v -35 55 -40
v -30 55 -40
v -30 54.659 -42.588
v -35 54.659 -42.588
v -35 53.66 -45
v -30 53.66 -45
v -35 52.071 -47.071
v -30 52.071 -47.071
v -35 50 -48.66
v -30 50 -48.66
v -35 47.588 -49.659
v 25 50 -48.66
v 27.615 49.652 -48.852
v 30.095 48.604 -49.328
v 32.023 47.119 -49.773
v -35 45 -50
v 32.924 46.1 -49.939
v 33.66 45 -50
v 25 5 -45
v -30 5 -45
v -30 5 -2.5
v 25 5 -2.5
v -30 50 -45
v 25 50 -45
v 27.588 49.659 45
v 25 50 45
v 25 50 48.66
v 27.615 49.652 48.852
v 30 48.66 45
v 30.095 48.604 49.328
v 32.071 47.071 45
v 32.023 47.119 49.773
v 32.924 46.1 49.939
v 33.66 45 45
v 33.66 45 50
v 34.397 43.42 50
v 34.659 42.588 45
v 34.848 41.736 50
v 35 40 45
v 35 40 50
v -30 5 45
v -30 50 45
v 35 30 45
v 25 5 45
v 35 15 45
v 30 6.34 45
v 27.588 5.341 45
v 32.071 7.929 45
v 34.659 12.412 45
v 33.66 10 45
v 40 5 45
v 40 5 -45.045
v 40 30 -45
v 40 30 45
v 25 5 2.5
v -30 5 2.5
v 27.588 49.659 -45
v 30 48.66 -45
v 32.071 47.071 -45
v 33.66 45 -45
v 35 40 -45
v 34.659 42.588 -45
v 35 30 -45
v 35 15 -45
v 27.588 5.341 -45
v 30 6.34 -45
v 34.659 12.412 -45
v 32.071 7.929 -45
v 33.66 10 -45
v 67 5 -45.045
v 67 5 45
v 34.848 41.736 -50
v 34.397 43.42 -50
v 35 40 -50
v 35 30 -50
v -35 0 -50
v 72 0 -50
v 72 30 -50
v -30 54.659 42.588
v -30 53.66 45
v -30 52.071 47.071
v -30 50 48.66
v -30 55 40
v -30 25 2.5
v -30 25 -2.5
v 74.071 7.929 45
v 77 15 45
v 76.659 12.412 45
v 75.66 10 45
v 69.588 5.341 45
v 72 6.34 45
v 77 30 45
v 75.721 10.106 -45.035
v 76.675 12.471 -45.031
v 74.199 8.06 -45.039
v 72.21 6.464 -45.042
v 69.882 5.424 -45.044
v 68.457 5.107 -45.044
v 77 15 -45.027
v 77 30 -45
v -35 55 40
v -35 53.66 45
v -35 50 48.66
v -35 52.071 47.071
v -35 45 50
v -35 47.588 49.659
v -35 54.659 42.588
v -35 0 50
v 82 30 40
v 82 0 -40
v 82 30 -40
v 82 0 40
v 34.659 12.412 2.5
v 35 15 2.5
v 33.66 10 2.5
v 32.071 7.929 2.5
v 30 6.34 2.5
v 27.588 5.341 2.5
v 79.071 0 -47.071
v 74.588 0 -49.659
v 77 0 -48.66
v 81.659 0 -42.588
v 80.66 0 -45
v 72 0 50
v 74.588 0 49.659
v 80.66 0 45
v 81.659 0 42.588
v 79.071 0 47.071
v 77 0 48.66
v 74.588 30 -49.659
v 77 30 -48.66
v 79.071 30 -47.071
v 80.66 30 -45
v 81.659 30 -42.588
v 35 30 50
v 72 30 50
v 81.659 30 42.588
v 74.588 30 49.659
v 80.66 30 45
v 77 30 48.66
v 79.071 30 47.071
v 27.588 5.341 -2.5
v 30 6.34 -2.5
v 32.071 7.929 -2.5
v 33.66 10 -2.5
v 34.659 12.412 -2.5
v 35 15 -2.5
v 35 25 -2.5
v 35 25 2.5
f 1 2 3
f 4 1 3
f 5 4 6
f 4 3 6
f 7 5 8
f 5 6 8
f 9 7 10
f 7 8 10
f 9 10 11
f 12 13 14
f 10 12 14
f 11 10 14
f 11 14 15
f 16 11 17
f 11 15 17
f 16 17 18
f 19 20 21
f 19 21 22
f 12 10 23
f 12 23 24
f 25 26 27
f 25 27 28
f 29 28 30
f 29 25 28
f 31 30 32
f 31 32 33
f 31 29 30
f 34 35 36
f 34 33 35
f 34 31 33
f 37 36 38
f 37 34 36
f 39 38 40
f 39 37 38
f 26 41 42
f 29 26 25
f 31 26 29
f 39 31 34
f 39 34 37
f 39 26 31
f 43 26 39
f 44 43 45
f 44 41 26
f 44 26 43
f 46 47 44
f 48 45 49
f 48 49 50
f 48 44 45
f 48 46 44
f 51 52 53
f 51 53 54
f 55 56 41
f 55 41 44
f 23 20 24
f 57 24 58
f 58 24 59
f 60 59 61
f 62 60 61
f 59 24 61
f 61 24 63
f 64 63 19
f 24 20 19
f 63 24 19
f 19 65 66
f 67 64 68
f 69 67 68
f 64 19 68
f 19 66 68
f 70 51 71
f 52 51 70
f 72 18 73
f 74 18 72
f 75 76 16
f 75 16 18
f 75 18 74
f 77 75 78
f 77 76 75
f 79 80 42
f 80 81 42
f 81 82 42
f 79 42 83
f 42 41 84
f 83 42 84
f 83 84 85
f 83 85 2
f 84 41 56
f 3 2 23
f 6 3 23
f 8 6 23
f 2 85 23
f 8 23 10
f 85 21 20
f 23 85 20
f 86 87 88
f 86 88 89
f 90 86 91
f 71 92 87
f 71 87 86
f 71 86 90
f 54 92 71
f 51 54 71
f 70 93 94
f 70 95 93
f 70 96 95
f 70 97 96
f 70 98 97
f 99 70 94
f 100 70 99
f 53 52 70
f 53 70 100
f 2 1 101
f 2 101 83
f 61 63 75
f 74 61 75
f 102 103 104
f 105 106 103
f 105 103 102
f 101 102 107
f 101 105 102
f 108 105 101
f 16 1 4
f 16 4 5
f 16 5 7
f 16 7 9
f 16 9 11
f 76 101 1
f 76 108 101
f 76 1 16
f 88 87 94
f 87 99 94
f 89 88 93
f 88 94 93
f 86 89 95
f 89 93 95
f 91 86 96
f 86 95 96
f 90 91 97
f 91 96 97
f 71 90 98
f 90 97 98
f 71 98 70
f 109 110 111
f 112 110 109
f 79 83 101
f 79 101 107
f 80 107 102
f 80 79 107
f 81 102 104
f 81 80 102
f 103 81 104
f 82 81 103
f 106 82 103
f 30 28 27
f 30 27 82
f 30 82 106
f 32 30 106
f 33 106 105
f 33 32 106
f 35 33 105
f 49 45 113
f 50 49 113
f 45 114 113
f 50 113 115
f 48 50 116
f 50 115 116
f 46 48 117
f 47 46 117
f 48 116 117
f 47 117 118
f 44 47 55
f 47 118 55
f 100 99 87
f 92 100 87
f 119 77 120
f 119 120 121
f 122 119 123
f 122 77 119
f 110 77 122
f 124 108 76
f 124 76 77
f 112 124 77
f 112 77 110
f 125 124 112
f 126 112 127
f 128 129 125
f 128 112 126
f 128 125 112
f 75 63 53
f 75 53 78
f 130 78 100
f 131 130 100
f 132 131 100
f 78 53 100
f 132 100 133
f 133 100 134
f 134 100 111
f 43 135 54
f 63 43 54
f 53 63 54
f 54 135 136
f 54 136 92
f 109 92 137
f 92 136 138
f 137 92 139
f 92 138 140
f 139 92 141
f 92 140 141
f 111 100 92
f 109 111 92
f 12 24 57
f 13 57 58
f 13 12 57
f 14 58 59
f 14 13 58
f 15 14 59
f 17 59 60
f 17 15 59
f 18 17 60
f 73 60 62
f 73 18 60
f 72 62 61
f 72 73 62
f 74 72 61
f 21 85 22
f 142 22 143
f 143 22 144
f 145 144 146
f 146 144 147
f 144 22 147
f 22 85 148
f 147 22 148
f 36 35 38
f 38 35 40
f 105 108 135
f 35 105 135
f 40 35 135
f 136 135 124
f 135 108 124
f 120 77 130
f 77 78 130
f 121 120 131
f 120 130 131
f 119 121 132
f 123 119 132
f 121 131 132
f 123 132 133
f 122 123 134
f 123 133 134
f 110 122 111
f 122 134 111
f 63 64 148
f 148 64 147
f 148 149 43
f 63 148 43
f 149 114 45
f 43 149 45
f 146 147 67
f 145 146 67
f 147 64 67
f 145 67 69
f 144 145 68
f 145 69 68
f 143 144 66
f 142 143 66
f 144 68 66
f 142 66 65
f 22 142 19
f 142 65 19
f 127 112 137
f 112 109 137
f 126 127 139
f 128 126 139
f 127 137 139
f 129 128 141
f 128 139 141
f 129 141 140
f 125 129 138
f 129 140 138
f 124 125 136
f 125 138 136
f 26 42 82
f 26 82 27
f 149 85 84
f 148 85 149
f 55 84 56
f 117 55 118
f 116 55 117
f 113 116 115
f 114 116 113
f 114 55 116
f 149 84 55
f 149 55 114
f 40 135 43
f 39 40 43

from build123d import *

# Parameters (mm, degrees)
CROQUIS1_W                   = 70
CROQUIS1_H                   = 100
SALIENTE_EXTRUIR2_DEPTH      = 5
CROQUIS2_W                   = 5
CROQUIS2_H                   = 100
SALIENTE_EXTRUIR3_DEPTH      = 50
CROQUIS3_W                   = 65
CROQUIS3_H                   = 5
SALIENTE_EXTRUIR4_DEPTH      = 45
CROQUIS4_W                   = 65
CROQUIS4_H                   = 5
SALIENTE_EXTRUIR5_DEPTH      = 45
CROQUIS5_W                   = 5
CROQUIS5_H                   = 100
SALIENTE_EXTRUIR6_DEPTH      = 30
REDONDEO2_R                  = 10
REDONDEO3_R                  = 10
REDONDEO4_R                  = 10
REDONDEO5_R                  = 10
SALIENTE_EXTRUIR8_DEPTH      = 2.5
SALIENTE_EXTRUIR8_DEPTH_BACK = 2.5
CROQUIS10_W                  = 65
CROQUIS10_H                  = 20
SALIENTE_EXTRUIR9_DEPTH      = 37
CROQUIS12_W                  = 5
CROQUIS12_H                  = 100
SALIENTE_EXTRUIR10_DEPTH     = 30
REDONDEO10_R                 = 10
REDONDEO11_R                 = 10
REDONDEO13_R                 = 10
REDONDEO16_R                 = 10


with BuildPart() as part:
    # Croquis1 → Saliente-Extruir2 (new body)
    with BuildSketch(Plane(origin=(0, 0, 0), x_dir=(1, 0, 0), z_dir=(0, 1, 0))):
        Rectangle(CROQUIS1_W, CROQUIS1_H)
    extrude(amount=SALIENTE_EXTRUIR2_DEPTH)

    # Croquis2 → Saliente-Extruir3 (add)
    with BuildSketch(Plane(origin=(0, 5, 0), x_dir=(1, 0, 0), z_dir=(0, 1, 0))):
        with Locations((-32.5, 0)):
            Rectangle(CROQUIS2_W, CROQUIS2_H)
    extrude(amount=SALIENTE_EXTRUIR3_DEPTH)

    # Croquis3 → Saliente-Extruir4 (add)
    with BuildSketch(Plane(origin=(0, 5, 0), x_dir=(1, 0, 0), z_dir=(0, 1, 0))):
        with Locations((2.5, -47.5)):
            Rectangle(CROQUIS3_W, CROQUIS3_H)
    extrude(amount=SALIENTE_EXTRUIR4_DEPTH)

    # Croquis4 → Saliente-Extruir5 (add)
    with BuildSketch(Plane(origin=(0, 5, 0), x_dir=(1, 0, 0), z_dir=(0, 1, 0))):
        with Locations((2.5, 47.5)):
            Rectangle(CROQUIS4_W, CROQUIS4_H)
    extrude(amount=SALIENTE_EXTRUIR5_DEPTH)

    # Croquis5 → Saliente-Extruir6 (add)
    with BuildSketch(Plane.XZ):
        with Locations((37.5, 0)):
            Rectangle(CROQUIS5_W, CROQUIS5_H)
    extrude(amount=-SALIENTE_EXTRUIR6_DEPTH)

    # Redondeo2
    redondeo2_edges = [part.edges().sort_by_distance(p)[0] for p in [
        (35, 50, 47.5),
    ]]
    fillet(redondeo2_edges, radius=REDONDEO2_R)

    # Redondeo3
    redondeo3_edges = [part.edges().sort_by_distance(p)[0] for p in [
        (35, 50, -47.5),
    ]]
    fillet(redondeo3_edges, radius=REDONDEO3_R)

    # Redondeo4
    redondeo4_edges = [part.edges().sort_by_distance(p)[0] for p in [
        (-32.5, 55, 50),
    ]]
    fillet(redondeo4_edges, radius=REDONDEO4_R)

    # Redondeo5
    redondeo5_edges = [part.edges().sort_by_distance(p)[0] for p in [
        (-32.5, 55, -50),
    ]]
    fillet(redondeo5_edges, radius=REDONDEO5_R)

    # Croquis10 → Saliente-Extruir8 (add, two sides: drawn at the far end of the back side and taken through both)
    with BuildSketch(Plane.XY.offset(-SALIENTE_EXTRUIR8_DEPTH_BACK)):
        with Locations((2.5, 15)):
            Rectangle(CROQUIS10_W, CROQUIS10_H)
    extrude(amount=SALIENTE_EXTRUIR8_DEPTH + SALIENTE_EXTRUIR8_DEPTH_BACK)

    # Croquis11 → Saliente-Extruir9 (add)
    with BuildSketch(Plane(origin=(40, 0, 0), x_dir=(0, 0, -1), z_dir=(1, 0, 0))):
        Polygon((-50, 30), (-45, 30), (-45, 5), (45.044544461, 5), (45, 30), (50, 30), (50, 0), (-50, 0), align=None)
    extrude(amount=SALIENTE_EXTRUIR9_DEPTH)

    # Croquis12 → Saliente-Extruir10 (add)
    with BuildSketch(Plane.XZ):
        with Locations((79.5, 0)):
            Rectangle(CROQUIS12_W, CROQUIS12_H)
    extrude(amount=-SALIENTE_EXTRUIR10_DEPTH)

    # Redondeo10
    redondeo10_edges = [part.edges().sort_by_distance(p)[0] for p in [
        (77, 5, -0.022272231),
    ]]
    fillet(redondeo10_edges, radius=REDONDEO10_R)

    # Redondeo11
    redondeo11_edges = [part.edges().sort_by_distance(p)[0] for p in [
        (82, 15, -50),
    ]]
    fillet(redondeo11_edges, radius=REDONDEO11_R)

    # Redondeo13
    redondeo13_edges = [part.edges().sort_by_distance(p)[0] for p in [
        (82, 15, 50),
    ]]
    fillet(redondeo13_edges, radius=REDONDEO13_R)

    # Redondeo16
    redondeo16_edges = [part.edges().sort_by_distance(p)[0] for p in [
        (35, 5, -23.75),
        (35, 5, 23.75),
    ]]
    fillet(redondeo16_edges, radius=REDONDEO16_R)


solid = part.part
